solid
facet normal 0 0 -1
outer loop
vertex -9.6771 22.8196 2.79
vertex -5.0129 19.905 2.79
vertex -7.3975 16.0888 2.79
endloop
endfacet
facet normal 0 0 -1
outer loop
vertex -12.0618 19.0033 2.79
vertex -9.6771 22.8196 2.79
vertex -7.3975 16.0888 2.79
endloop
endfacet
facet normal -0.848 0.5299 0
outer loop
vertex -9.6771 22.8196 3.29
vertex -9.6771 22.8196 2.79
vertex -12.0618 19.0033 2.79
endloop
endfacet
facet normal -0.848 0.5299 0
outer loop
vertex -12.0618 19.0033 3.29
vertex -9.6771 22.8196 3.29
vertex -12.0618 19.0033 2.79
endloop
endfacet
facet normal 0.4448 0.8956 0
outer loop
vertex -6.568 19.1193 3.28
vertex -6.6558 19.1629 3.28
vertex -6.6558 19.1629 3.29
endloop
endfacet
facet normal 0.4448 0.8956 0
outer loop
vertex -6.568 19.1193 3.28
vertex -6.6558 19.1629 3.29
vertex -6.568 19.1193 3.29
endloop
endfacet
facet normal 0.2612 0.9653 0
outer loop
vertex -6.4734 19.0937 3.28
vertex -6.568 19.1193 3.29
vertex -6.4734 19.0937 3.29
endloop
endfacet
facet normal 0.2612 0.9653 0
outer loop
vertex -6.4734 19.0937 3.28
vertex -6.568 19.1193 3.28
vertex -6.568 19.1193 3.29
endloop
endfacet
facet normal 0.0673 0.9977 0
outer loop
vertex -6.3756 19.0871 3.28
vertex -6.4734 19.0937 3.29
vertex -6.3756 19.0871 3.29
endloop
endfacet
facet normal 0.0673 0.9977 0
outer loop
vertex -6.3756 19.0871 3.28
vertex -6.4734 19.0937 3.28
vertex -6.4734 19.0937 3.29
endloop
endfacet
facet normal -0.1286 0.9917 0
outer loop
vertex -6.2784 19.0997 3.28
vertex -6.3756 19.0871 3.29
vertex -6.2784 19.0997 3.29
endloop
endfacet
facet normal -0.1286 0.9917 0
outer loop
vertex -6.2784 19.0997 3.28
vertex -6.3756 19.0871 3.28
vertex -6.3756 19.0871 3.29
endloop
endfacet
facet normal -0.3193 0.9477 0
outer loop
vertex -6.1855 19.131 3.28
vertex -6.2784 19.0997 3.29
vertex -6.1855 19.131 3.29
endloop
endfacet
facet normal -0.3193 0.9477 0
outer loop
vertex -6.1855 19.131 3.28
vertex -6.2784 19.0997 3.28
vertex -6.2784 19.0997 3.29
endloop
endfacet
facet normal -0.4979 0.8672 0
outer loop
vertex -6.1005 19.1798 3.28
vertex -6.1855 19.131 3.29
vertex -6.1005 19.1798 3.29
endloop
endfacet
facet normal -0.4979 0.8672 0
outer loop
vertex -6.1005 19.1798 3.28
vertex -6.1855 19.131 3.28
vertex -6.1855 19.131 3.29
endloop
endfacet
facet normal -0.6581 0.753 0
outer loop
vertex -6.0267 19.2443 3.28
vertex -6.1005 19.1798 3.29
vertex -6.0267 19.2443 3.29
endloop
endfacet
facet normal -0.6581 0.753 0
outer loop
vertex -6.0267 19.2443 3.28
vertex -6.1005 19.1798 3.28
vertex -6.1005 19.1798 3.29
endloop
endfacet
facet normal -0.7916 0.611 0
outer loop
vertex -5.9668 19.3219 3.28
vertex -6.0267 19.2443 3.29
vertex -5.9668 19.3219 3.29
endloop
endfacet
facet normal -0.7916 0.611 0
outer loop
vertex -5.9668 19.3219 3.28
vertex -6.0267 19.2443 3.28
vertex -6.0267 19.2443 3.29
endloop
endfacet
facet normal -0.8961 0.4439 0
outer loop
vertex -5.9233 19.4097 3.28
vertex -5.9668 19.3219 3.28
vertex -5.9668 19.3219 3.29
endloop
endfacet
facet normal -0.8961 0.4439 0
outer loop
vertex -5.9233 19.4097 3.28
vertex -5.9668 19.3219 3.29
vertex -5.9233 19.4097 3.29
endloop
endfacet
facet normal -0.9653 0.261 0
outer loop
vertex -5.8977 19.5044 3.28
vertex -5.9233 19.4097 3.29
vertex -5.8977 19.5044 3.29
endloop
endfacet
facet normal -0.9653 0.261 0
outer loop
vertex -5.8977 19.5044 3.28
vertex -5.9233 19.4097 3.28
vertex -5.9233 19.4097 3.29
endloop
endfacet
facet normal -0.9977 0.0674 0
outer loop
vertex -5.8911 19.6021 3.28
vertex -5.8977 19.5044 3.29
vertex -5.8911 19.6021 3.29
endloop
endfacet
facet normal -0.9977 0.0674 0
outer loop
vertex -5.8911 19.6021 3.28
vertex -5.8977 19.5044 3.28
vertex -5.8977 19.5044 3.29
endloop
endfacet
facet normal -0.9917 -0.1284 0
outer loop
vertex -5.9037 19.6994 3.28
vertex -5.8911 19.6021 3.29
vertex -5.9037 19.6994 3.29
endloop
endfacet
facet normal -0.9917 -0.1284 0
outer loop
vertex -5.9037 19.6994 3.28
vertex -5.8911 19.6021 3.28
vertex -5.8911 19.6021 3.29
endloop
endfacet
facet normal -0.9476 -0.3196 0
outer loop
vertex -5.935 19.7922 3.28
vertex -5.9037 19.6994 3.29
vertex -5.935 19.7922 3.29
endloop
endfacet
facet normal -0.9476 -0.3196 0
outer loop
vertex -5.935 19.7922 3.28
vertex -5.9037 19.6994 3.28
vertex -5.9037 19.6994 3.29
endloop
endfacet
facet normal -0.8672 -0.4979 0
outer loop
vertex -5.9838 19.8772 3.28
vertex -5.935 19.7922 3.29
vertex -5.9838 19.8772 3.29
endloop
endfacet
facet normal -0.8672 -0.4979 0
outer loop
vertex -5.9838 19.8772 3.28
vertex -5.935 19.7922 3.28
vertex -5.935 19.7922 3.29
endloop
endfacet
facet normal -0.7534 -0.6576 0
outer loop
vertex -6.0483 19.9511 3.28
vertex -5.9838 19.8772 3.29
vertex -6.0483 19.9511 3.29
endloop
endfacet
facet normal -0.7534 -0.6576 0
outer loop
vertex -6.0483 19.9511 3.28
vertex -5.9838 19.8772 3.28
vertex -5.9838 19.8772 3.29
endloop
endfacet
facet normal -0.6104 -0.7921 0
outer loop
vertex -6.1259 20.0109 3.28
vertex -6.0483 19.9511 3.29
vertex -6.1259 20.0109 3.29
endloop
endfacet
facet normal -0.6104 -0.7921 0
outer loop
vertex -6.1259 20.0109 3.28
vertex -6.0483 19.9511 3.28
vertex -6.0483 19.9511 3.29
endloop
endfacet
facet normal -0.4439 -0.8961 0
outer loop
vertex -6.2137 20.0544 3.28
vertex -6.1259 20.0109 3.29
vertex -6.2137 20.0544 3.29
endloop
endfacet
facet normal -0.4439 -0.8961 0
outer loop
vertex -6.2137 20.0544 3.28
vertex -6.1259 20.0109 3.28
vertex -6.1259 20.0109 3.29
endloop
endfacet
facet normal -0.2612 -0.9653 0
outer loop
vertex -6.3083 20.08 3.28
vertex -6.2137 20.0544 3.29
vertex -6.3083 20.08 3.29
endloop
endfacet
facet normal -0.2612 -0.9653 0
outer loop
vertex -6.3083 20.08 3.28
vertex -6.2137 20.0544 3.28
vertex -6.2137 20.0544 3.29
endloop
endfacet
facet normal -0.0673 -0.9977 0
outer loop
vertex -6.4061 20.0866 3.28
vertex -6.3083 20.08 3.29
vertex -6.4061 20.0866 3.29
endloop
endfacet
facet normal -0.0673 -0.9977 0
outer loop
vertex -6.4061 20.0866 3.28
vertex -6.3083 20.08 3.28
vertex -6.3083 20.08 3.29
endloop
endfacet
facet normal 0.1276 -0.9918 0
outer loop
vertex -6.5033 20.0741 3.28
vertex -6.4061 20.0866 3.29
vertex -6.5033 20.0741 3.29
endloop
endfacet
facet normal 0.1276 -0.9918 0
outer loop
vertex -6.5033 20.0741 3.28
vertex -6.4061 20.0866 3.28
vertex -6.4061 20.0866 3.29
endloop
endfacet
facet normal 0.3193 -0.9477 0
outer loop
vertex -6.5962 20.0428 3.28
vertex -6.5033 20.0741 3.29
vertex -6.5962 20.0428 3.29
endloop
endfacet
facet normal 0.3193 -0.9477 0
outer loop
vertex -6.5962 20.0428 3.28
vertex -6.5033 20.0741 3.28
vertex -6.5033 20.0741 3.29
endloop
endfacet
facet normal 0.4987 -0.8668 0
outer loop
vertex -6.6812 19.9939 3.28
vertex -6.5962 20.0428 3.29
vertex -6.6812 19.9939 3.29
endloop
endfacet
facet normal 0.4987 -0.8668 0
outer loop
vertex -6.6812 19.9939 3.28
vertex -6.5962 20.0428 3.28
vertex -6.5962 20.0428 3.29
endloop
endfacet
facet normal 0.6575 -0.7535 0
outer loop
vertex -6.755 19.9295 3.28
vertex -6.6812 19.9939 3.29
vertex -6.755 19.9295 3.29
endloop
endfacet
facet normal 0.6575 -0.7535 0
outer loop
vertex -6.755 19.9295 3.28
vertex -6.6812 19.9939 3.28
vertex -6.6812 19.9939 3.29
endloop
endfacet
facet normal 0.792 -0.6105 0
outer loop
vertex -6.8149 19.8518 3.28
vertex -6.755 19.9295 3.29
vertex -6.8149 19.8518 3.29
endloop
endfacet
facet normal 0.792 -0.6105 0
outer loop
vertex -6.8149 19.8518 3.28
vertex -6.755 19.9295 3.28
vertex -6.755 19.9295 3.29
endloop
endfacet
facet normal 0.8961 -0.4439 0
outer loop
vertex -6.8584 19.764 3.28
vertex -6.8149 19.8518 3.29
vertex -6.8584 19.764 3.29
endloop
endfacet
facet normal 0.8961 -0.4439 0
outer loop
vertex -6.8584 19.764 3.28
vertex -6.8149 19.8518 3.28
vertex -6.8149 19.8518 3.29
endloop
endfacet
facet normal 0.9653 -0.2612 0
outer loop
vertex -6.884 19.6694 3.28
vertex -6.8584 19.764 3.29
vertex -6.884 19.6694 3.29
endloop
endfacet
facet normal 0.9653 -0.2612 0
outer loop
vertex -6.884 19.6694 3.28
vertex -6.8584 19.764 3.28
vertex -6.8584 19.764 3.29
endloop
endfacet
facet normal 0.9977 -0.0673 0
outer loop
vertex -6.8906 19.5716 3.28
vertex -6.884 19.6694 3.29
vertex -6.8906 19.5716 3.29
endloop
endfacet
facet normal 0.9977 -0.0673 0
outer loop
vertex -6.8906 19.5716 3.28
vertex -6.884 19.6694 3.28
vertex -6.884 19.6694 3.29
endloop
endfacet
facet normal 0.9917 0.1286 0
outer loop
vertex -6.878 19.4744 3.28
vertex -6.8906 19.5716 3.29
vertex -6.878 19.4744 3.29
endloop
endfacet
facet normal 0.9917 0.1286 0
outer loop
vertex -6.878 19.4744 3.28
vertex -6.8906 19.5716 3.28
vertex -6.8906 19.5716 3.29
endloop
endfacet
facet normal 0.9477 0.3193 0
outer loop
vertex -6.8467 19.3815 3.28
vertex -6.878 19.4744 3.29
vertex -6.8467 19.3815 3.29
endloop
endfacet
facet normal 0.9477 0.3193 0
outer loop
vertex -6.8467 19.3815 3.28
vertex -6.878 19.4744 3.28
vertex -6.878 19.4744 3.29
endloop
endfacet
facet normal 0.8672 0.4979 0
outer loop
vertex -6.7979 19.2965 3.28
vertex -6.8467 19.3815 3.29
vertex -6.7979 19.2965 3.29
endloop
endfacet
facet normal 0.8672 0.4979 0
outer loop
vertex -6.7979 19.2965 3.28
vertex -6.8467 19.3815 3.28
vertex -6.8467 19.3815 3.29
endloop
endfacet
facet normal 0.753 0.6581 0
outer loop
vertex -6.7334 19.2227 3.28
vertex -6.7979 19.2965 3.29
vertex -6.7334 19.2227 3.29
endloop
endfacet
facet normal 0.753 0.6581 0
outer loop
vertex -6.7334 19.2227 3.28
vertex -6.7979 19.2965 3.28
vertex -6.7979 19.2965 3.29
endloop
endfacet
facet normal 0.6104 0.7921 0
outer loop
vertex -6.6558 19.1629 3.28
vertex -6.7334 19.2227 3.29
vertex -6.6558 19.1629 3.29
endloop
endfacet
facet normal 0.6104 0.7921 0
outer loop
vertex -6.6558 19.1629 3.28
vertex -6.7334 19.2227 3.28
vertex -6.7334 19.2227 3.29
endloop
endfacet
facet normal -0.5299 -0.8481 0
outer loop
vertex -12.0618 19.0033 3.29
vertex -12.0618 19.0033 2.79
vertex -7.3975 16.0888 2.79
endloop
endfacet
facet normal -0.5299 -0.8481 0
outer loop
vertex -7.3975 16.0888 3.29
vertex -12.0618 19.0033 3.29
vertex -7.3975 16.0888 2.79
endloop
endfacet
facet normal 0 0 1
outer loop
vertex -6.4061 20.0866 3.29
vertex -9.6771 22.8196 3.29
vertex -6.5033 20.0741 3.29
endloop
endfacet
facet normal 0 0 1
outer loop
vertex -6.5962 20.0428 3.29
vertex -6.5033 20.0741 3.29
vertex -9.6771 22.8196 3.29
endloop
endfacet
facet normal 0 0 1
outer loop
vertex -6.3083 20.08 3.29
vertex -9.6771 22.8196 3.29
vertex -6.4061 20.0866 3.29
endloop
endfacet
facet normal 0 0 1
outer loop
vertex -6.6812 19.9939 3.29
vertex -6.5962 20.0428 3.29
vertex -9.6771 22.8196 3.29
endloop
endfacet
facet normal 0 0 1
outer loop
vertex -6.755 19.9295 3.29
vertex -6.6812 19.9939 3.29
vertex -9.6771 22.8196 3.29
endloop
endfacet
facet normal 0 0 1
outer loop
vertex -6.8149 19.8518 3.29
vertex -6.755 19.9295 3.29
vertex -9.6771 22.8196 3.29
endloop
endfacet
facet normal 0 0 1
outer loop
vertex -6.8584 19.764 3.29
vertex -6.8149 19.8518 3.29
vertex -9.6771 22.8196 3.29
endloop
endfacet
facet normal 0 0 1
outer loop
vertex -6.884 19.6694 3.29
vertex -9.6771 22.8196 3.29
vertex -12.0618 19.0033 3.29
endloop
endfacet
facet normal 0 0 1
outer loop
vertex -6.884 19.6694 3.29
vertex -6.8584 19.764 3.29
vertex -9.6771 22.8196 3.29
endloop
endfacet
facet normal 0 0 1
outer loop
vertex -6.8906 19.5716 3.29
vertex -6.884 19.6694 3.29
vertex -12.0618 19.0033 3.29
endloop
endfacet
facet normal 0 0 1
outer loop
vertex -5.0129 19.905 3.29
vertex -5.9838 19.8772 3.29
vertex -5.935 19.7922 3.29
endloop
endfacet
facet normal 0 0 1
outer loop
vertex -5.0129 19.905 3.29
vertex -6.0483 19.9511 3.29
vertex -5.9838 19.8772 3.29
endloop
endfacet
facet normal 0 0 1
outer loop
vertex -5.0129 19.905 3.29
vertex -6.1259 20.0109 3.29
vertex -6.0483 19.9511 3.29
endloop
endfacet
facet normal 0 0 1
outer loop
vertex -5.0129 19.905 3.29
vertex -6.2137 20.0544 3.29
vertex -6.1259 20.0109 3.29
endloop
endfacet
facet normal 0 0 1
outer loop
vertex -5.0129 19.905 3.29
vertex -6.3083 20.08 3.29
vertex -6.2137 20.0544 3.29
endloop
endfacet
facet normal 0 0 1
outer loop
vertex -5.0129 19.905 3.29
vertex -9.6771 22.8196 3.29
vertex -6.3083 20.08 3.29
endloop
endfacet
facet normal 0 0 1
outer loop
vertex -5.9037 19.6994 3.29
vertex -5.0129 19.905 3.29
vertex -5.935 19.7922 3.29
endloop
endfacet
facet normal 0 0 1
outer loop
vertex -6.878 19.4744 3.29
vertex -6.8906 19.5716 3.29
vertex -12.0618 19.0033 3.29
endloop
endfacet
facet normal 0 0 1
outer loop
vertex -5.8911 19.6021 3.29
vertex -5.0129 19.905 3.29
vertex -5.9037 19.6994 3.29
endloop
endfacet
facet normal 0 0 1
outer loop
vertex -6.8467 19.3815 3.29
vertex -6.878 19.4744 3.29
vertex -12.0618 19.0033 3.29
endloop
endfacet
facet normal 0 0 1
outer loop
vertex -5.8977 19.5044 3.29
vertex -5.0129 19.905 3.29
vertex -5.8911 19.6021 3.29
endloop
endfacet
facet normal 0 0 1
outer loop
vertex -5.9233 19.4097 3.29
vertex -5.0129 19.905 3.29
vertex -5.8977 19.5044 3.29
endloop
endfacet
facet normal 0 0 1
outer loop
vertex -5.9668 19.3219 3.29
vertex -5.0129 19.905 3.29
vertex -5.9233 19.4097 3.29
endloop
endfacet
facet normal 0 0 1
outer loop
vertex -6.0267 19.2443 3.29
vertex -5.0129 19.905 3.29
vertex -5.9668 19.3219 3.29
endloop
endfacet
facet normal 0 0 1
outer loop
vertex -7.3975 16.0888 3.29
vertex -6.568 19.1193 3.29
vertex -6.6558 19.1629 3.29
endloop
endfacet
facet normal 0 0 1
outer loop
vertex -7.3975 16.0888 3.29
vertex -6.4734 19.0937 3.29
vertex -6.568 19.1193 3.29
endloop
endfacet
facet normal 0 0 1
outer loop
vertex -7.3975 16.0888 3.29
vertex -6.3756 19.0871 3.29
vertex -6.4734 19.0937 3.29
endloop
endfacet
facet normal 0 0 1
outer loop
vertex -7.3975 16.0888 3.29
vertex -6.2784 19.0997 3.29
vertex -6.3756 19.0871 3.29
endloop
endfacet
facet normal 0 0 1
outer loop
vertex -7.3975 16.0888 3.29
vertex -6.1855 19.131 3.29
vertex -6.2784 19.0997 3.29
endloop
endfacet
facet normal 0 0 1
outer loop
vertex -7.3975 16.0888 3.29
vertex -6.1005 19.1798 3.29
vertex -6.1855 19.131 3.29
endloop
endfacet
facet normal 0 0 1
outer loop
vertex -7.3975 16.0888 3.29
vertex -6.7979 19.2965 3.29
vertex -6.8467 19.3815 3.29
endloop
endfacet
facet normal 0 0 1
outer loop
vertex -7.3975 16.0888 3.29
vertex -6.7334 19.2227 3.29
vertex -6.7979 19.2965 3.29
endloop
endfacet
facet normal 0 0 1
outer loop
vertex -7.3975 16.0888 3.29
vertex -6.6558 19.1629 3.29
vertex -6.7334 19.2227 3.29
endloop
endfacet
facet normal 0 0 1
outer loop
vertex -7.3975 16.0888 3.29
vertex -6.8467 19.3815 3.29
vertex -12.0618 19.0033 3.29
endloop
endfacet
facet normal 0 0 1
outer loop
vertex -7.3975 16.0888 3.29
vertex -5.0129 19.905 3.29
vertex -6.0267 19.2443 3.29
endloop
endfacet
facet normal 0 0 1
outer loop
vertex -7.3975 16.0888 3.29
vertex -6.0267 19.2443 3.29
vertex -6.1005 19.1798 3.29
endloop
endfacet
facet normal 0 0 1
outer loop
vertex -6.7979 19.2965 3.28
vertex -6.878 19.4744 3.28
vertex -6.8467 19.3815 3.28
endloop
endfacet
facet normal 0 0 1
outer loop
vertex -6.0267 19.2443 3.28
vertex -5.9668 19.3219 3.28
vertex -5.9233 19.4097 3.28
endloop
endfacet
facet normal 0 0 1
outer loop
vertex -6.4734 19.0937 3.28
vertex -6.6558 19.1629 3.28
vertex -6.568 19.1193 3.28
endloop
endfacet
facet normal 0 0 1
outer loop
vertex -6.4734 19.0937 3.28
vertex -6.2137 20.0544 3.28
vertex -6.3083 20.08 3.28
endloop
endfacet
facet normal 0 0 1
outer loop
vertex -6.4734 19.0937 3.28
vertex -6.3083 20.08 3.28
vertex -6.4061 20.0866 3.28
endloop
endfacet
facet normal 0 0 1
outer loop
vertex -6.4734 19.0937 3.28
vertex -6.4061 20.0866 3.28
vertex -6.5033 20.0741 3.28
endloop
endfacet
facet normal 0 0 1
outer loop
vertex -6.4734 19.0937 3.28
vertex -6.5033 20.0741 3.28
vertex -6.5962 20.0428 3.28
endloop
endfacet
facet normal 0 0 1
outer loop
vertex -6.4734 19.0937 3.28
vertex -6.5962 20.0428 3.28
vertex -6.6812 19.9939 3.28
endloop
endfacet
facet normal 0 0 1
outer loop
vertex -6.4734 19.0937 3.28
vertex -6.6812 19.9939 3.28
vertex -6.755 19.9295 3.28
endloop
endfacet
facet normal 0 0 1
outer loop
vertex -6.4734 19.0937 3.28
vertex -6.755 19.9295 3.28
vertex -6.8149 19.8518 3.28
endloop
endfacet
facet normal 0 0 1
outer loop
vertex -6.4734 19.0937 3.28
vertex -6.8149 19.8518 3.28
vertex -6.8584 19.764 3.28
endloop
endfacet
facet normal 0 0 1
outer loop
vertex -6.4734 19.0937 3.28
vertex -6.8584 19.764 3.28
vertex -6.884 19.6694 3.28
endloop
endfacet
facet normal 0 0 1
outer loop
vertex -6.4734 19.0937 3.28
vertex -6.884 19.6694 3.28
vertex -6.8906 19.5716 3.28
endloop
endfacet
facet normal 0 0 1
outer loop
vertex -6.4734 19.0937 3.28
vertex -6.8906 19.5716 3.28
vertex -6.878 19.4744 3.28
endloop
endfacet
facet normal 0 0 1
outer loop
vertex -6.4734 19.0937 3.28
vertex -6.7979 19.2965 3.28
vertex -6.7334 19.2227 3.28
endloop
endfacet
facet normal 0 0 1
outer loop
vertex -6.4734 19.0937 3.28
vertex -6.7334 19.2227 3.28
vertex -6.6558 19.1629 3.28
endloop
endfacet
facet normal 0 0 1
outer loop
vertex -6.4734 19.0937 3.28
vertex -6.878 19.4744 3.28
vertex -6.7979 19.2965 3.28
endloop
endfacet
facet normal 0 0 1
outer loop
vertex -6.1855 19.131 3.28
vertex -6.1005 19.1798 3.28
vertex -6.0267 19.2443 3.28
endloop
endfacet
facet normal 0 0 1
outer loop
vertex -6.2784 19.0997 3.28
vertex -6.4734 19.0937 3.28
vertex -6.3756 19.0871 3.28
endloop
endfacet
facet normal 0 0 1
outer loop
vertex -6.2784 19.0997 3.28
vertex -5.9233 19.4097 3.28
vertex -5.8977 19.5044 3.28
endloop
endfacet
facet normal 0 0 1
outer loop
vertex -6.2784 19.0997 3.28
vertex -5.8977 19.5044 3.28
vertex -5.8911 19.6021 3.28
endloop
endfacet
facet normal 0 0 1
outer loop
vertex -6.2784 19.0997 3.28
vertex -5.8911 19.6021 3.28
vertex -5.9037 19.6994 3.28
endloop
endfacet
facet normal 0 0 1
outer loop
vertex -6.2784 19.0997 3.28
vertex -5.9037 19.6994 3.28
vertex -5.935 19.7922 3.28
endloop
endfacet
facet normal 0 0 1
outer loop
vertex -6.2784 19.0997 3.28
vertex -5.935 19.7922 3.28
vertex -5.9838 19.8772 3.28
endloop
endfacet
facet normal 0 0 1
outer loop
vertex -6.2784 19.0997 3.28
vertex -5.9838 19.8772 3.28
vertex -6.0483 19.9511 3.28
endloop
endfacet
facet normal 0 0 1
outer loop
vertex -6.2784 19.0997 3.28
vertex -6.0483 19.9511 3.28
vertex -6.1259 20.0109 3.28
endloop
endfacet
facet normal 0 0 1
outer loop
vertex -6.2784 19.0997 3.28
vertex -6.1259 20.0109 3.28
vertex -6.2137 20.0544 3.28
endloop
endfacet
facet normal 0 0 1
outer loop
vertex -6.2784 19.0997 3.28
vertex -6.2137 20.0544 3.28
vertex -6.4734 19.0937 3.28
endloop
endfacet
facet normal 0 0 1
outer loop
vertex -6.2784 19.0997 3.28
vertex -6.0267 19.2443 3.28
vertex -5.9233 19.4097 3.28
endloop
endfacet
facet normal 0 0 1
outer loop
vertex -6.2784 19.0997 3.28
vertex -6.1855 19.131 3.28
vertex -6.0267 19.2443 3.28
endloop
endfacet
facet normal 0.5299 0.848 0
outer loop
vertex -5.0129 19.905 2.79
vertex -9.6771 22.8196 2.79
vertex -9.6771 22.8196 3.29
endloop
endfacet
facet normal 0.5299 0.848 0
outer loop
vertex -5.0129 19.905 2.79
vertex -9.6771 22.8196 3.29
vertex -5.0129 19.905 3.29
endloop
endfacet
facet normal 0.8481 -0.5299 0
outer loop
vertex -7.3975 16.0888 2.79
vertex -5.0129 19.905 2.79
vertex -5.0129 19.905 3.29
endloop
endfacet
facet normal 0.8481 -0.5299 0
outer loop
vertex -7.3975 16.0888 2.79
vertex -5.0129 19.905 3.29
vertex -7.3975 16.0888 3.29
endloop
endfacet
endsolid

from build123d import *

# Parameters (mm, degrees)
CYLINDER082_R          = 0.5
CYLINDER082_DEPTH      = 0.01
BOX179_W               = 4.5
BOX179_H               = 5.5
BOX179_DEPTH           = 0.5
CUT088_PLACEMENT_ANGLE = 122


with BuildPart() as cylinder082:
    # Cylinder082 → Cylinder082 (new body)
    with BuildSketch(Plane(origin=(1, 4.5, 0.49), x_dir=(1, 0, 0), z_dir=(0, 0, 1))):
        Circle(CYLINDER082_R)
    extrude(amount=CYLINDER082_DEPTH)


with BuildPart() as small_linbo3_plate090:
    # Box179 → Box179 (new body)
    with BuildSketch(Plane.XY):
        with Locations((2.25, 2.75)):
            Rectangle(BOX179_W, BOX179_H)
    extrude(amount=BOX179_DEPTH)

    # Cut088: cut Cylinder082
    add(cylinder082.part, mode=Mode.SUBTRACT)


with BuildPart() as small_linbo3_plate090_1:
    # Cut088 placement: moved
    add(small_linbo3_plate090.part.moved(Location((-9.677147, 22.819562, 2.79))).rotate(Axis((-9.677147, 22.819562, 2.79), (0, 0, -1)), CUT088_PLACEMENT_ANGLE))


solid = small_linbo3_plate090_1.part
